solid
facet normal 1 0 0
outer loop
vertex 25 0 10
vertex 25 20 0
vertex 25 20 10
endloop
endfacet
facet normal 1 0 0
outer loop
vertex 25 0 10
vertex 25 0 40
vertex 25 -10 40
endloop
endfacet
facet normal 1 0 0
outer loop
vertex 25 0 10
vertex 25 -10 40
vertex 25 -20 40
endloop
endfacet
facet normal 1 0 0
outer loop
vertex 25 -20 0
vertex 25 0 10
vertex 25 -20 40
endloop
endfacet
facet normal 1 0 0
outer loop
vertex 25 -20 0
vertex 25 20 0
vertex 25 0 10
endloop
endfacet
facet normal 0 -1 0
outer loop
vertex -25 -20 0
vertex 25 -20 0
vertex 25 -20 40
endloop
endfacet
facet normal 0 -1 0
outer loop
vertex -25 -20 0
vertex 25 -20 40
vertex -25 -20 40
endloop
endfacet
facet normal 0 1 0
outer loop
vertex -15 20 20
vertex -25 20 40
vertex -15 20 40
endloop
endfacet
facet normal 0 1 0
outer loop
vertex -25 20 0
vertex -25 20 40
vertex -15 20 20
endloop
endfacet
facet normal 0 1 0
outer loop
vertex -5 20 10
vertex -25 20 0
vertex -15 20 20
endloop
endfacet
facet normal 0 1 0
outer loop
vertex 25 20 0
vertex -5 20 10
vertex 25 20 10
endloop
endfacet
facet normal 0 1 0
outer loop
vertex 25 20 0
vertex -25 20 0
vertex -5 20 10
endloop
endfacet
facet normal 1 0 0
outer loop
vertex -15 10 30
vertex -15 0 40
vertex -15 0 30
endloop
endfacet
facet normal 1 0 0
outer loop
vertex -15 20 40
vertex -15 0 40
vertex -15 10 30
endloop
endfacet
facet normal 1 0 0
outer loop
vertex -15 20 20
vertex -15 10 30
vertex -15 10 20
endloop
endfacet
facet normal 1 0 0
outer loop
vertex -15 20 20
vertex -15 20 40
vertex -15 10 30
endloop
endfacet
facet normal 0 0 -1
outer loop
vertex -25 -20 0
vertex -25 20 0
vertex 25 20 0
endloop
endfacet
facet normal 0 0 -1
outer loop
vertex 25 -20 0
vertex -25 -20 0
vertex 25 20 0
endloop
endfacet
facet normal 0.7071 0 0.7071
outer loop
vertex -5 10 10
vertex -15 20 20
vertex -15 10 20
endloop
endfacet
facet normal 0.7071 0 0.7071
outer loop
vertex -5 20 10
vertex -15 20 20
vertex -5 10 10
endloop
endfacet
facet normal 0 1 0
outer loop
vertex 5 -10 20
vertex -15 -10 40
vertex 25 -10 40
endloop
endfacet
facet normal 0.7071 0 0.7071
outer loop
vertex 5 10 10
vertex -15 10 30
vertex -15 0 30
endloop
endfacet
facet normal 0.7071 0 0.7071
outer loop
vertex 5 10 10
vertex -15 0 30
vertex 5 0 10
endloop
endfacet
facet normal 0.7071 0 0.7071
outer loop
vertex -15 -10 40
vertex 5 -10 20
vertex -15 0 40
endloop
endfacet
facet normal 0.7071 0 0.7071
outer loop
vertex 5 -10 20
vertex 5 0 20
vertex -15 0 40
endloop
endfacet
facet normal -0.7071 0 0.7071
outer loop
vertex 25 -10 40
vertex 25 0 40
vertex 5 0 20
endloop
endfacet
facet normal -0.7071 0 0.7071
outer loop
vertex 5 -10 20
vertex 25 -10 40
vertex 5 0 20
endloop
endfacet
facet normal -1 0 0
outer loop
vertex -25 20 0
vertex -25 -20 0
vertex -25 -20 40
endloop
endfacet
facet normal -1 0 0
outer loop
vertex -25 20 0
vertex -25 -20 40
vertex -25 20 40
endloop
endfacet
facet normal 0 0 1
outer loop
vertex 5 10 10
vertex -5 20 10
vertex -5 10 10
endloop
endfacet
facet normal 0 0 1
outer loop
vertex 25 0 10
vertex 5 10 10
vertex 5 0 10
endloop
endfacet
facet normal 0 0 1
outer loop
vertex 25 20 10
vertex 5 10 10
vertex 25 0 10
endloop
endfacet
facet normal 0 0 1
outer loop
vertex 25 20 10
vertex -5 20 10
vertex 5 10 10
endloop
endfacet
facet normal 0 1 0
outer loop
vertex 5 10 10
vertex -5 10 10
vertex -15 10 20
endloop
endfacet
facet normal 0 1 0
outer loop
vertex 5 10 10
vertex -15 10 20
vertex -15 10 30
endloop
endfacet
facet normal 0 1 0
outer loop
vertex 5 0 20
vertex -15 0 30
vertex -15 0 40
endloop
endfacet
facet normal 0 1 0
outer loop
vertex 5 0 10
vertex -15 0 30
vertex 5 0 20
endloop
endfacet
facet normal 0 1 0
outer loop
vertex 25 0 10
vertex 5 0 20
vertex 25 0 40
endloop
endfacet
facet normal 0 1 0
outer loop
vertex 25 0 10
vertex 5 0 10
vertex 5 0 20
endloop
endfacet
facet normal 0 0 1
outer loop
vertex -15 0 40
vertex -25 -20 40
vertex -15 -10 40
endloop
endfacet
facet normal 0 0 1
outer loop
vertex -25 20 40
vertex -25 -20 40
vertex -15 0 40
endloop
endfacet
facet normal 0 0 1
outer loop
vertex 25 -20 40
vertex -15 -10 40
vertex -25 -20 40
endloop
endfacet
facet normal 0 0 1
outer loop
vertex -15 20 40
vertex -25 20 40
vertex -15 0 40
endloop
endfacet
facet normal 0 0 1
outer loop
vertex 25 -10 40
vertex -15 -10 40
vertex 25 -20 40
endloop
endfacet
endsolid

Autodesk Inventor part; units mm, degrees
ref_plane "YZ Plane" through (0, 0, 0) normal (1, 0, 0) x (0, 1, 0)
ref_plane "XZ Plane" through (0, 0, 0) normal (0, 1, 0) x (-1, 0, 0)
ref_plane "XY Plane" through (0, 0, 0) normal (0, 0, 1) x (1, 0, 0)
sketch "草圖1" plane through (0, 0, 0) normal (0, 0, 1) x (1, 0, 0)
  line L0 (25, -20) -> (-25, -20)
  line L1 (-25, -20) -> (-25, 20)
  line L2 (-25, 20) -> (25, 20)
  line L3 (25, 20) -> (25, -20)
  line L4 (25, -20) -> (-25, 20) construction
  line L5 (-25, -20) -> (25, 20) construction
  point P0 (0, 0)
  dimension "d0" = 40
  dimension "d1" = 50
extrude "擠出1" add sketch "草圖1" along normal blind 40
sketch "草圖2" plane through (-25, 20, 0) normal (0, 1, 0) x (1, 0, 0)
  line L0 (50, -40) -> (0, -40) projected
  line L1 (50, 0) -> (50, -40) projected
  line L2 (0, 0) -> (0, -40) projected
  line L3 (50, 0) -> (0, 0) projected
  line L4 (0, -40) -> (50, -40) projected
  line L5 (50, -40) -> (30, -20)
  line L6 (30, -20) -> (10, -40)
  line L7 (10, -40) -> (50, -40)
  line L8 (50, 0) -> (0, 0) projected
  line L9 (0, 0) -> (0, -40) projected
  line L10 (50, -40) -> (0, -40) projected
  line L11 (50, 0) -> (50, -40) projected
  point P0 (25, 0)
  dimension "d4" = 10
  dimension "d5" = 20
  dimension "d6" = 20
extrude "擠出2" cut sketch "草圖2" against normal blind 30 contours L0 L6 L5
sketch "草圖3" plane through (-25, 20, 0) normal (0, 1, 0) x (1, 0, 0)
  line L0 (0, -40) -> (50, -40) projected
  line L1 (10, -40) -> (10, -30)
  line L2 (10, -30) -> (30, -10)
  line L3 (30, -10) -> (50, -10)
  line L4 (50, 0) -> (50, -40) projected
  line L5 (50, 0) -> (0, 0) projected
  line L6 (0, 0) -> (0, -40) projected
  point P0 (25, 0)
  dimension "d9" = 10
  dimension "d10" = 10
  dimension "d11" = 10
  dimension "d12" = 20
extrude "擠出3" cut sketch "草圖3" against normal blind 20 contours L1 L2 L3 L4 L0
sketch "草圖4" plane through (-25, 20, 0) normal (0, 1, 0) x (1, 0, 0)
  line L0 (10, -40) -> (10, -30) projected
  line L1 (10, -30) -> (10, -20)
  line L2 (10, -20) -> (20, -10)
  line L3 (30, -10) -> (50, -10) projected
  line L4 (20, -10) -> (30, -10)
  line L5 (30, -10) -> (50, -10) projected
  line L6 (10, -30) -> (30, -10)
  line L7 (10, -30) -> (30, -10) projected
  point P0 (25, 0)
  dimension "d15" = 10
  dimension "d16" = 10
extrude "擠出4" cut sketch "草圖4" against normal blind 10
